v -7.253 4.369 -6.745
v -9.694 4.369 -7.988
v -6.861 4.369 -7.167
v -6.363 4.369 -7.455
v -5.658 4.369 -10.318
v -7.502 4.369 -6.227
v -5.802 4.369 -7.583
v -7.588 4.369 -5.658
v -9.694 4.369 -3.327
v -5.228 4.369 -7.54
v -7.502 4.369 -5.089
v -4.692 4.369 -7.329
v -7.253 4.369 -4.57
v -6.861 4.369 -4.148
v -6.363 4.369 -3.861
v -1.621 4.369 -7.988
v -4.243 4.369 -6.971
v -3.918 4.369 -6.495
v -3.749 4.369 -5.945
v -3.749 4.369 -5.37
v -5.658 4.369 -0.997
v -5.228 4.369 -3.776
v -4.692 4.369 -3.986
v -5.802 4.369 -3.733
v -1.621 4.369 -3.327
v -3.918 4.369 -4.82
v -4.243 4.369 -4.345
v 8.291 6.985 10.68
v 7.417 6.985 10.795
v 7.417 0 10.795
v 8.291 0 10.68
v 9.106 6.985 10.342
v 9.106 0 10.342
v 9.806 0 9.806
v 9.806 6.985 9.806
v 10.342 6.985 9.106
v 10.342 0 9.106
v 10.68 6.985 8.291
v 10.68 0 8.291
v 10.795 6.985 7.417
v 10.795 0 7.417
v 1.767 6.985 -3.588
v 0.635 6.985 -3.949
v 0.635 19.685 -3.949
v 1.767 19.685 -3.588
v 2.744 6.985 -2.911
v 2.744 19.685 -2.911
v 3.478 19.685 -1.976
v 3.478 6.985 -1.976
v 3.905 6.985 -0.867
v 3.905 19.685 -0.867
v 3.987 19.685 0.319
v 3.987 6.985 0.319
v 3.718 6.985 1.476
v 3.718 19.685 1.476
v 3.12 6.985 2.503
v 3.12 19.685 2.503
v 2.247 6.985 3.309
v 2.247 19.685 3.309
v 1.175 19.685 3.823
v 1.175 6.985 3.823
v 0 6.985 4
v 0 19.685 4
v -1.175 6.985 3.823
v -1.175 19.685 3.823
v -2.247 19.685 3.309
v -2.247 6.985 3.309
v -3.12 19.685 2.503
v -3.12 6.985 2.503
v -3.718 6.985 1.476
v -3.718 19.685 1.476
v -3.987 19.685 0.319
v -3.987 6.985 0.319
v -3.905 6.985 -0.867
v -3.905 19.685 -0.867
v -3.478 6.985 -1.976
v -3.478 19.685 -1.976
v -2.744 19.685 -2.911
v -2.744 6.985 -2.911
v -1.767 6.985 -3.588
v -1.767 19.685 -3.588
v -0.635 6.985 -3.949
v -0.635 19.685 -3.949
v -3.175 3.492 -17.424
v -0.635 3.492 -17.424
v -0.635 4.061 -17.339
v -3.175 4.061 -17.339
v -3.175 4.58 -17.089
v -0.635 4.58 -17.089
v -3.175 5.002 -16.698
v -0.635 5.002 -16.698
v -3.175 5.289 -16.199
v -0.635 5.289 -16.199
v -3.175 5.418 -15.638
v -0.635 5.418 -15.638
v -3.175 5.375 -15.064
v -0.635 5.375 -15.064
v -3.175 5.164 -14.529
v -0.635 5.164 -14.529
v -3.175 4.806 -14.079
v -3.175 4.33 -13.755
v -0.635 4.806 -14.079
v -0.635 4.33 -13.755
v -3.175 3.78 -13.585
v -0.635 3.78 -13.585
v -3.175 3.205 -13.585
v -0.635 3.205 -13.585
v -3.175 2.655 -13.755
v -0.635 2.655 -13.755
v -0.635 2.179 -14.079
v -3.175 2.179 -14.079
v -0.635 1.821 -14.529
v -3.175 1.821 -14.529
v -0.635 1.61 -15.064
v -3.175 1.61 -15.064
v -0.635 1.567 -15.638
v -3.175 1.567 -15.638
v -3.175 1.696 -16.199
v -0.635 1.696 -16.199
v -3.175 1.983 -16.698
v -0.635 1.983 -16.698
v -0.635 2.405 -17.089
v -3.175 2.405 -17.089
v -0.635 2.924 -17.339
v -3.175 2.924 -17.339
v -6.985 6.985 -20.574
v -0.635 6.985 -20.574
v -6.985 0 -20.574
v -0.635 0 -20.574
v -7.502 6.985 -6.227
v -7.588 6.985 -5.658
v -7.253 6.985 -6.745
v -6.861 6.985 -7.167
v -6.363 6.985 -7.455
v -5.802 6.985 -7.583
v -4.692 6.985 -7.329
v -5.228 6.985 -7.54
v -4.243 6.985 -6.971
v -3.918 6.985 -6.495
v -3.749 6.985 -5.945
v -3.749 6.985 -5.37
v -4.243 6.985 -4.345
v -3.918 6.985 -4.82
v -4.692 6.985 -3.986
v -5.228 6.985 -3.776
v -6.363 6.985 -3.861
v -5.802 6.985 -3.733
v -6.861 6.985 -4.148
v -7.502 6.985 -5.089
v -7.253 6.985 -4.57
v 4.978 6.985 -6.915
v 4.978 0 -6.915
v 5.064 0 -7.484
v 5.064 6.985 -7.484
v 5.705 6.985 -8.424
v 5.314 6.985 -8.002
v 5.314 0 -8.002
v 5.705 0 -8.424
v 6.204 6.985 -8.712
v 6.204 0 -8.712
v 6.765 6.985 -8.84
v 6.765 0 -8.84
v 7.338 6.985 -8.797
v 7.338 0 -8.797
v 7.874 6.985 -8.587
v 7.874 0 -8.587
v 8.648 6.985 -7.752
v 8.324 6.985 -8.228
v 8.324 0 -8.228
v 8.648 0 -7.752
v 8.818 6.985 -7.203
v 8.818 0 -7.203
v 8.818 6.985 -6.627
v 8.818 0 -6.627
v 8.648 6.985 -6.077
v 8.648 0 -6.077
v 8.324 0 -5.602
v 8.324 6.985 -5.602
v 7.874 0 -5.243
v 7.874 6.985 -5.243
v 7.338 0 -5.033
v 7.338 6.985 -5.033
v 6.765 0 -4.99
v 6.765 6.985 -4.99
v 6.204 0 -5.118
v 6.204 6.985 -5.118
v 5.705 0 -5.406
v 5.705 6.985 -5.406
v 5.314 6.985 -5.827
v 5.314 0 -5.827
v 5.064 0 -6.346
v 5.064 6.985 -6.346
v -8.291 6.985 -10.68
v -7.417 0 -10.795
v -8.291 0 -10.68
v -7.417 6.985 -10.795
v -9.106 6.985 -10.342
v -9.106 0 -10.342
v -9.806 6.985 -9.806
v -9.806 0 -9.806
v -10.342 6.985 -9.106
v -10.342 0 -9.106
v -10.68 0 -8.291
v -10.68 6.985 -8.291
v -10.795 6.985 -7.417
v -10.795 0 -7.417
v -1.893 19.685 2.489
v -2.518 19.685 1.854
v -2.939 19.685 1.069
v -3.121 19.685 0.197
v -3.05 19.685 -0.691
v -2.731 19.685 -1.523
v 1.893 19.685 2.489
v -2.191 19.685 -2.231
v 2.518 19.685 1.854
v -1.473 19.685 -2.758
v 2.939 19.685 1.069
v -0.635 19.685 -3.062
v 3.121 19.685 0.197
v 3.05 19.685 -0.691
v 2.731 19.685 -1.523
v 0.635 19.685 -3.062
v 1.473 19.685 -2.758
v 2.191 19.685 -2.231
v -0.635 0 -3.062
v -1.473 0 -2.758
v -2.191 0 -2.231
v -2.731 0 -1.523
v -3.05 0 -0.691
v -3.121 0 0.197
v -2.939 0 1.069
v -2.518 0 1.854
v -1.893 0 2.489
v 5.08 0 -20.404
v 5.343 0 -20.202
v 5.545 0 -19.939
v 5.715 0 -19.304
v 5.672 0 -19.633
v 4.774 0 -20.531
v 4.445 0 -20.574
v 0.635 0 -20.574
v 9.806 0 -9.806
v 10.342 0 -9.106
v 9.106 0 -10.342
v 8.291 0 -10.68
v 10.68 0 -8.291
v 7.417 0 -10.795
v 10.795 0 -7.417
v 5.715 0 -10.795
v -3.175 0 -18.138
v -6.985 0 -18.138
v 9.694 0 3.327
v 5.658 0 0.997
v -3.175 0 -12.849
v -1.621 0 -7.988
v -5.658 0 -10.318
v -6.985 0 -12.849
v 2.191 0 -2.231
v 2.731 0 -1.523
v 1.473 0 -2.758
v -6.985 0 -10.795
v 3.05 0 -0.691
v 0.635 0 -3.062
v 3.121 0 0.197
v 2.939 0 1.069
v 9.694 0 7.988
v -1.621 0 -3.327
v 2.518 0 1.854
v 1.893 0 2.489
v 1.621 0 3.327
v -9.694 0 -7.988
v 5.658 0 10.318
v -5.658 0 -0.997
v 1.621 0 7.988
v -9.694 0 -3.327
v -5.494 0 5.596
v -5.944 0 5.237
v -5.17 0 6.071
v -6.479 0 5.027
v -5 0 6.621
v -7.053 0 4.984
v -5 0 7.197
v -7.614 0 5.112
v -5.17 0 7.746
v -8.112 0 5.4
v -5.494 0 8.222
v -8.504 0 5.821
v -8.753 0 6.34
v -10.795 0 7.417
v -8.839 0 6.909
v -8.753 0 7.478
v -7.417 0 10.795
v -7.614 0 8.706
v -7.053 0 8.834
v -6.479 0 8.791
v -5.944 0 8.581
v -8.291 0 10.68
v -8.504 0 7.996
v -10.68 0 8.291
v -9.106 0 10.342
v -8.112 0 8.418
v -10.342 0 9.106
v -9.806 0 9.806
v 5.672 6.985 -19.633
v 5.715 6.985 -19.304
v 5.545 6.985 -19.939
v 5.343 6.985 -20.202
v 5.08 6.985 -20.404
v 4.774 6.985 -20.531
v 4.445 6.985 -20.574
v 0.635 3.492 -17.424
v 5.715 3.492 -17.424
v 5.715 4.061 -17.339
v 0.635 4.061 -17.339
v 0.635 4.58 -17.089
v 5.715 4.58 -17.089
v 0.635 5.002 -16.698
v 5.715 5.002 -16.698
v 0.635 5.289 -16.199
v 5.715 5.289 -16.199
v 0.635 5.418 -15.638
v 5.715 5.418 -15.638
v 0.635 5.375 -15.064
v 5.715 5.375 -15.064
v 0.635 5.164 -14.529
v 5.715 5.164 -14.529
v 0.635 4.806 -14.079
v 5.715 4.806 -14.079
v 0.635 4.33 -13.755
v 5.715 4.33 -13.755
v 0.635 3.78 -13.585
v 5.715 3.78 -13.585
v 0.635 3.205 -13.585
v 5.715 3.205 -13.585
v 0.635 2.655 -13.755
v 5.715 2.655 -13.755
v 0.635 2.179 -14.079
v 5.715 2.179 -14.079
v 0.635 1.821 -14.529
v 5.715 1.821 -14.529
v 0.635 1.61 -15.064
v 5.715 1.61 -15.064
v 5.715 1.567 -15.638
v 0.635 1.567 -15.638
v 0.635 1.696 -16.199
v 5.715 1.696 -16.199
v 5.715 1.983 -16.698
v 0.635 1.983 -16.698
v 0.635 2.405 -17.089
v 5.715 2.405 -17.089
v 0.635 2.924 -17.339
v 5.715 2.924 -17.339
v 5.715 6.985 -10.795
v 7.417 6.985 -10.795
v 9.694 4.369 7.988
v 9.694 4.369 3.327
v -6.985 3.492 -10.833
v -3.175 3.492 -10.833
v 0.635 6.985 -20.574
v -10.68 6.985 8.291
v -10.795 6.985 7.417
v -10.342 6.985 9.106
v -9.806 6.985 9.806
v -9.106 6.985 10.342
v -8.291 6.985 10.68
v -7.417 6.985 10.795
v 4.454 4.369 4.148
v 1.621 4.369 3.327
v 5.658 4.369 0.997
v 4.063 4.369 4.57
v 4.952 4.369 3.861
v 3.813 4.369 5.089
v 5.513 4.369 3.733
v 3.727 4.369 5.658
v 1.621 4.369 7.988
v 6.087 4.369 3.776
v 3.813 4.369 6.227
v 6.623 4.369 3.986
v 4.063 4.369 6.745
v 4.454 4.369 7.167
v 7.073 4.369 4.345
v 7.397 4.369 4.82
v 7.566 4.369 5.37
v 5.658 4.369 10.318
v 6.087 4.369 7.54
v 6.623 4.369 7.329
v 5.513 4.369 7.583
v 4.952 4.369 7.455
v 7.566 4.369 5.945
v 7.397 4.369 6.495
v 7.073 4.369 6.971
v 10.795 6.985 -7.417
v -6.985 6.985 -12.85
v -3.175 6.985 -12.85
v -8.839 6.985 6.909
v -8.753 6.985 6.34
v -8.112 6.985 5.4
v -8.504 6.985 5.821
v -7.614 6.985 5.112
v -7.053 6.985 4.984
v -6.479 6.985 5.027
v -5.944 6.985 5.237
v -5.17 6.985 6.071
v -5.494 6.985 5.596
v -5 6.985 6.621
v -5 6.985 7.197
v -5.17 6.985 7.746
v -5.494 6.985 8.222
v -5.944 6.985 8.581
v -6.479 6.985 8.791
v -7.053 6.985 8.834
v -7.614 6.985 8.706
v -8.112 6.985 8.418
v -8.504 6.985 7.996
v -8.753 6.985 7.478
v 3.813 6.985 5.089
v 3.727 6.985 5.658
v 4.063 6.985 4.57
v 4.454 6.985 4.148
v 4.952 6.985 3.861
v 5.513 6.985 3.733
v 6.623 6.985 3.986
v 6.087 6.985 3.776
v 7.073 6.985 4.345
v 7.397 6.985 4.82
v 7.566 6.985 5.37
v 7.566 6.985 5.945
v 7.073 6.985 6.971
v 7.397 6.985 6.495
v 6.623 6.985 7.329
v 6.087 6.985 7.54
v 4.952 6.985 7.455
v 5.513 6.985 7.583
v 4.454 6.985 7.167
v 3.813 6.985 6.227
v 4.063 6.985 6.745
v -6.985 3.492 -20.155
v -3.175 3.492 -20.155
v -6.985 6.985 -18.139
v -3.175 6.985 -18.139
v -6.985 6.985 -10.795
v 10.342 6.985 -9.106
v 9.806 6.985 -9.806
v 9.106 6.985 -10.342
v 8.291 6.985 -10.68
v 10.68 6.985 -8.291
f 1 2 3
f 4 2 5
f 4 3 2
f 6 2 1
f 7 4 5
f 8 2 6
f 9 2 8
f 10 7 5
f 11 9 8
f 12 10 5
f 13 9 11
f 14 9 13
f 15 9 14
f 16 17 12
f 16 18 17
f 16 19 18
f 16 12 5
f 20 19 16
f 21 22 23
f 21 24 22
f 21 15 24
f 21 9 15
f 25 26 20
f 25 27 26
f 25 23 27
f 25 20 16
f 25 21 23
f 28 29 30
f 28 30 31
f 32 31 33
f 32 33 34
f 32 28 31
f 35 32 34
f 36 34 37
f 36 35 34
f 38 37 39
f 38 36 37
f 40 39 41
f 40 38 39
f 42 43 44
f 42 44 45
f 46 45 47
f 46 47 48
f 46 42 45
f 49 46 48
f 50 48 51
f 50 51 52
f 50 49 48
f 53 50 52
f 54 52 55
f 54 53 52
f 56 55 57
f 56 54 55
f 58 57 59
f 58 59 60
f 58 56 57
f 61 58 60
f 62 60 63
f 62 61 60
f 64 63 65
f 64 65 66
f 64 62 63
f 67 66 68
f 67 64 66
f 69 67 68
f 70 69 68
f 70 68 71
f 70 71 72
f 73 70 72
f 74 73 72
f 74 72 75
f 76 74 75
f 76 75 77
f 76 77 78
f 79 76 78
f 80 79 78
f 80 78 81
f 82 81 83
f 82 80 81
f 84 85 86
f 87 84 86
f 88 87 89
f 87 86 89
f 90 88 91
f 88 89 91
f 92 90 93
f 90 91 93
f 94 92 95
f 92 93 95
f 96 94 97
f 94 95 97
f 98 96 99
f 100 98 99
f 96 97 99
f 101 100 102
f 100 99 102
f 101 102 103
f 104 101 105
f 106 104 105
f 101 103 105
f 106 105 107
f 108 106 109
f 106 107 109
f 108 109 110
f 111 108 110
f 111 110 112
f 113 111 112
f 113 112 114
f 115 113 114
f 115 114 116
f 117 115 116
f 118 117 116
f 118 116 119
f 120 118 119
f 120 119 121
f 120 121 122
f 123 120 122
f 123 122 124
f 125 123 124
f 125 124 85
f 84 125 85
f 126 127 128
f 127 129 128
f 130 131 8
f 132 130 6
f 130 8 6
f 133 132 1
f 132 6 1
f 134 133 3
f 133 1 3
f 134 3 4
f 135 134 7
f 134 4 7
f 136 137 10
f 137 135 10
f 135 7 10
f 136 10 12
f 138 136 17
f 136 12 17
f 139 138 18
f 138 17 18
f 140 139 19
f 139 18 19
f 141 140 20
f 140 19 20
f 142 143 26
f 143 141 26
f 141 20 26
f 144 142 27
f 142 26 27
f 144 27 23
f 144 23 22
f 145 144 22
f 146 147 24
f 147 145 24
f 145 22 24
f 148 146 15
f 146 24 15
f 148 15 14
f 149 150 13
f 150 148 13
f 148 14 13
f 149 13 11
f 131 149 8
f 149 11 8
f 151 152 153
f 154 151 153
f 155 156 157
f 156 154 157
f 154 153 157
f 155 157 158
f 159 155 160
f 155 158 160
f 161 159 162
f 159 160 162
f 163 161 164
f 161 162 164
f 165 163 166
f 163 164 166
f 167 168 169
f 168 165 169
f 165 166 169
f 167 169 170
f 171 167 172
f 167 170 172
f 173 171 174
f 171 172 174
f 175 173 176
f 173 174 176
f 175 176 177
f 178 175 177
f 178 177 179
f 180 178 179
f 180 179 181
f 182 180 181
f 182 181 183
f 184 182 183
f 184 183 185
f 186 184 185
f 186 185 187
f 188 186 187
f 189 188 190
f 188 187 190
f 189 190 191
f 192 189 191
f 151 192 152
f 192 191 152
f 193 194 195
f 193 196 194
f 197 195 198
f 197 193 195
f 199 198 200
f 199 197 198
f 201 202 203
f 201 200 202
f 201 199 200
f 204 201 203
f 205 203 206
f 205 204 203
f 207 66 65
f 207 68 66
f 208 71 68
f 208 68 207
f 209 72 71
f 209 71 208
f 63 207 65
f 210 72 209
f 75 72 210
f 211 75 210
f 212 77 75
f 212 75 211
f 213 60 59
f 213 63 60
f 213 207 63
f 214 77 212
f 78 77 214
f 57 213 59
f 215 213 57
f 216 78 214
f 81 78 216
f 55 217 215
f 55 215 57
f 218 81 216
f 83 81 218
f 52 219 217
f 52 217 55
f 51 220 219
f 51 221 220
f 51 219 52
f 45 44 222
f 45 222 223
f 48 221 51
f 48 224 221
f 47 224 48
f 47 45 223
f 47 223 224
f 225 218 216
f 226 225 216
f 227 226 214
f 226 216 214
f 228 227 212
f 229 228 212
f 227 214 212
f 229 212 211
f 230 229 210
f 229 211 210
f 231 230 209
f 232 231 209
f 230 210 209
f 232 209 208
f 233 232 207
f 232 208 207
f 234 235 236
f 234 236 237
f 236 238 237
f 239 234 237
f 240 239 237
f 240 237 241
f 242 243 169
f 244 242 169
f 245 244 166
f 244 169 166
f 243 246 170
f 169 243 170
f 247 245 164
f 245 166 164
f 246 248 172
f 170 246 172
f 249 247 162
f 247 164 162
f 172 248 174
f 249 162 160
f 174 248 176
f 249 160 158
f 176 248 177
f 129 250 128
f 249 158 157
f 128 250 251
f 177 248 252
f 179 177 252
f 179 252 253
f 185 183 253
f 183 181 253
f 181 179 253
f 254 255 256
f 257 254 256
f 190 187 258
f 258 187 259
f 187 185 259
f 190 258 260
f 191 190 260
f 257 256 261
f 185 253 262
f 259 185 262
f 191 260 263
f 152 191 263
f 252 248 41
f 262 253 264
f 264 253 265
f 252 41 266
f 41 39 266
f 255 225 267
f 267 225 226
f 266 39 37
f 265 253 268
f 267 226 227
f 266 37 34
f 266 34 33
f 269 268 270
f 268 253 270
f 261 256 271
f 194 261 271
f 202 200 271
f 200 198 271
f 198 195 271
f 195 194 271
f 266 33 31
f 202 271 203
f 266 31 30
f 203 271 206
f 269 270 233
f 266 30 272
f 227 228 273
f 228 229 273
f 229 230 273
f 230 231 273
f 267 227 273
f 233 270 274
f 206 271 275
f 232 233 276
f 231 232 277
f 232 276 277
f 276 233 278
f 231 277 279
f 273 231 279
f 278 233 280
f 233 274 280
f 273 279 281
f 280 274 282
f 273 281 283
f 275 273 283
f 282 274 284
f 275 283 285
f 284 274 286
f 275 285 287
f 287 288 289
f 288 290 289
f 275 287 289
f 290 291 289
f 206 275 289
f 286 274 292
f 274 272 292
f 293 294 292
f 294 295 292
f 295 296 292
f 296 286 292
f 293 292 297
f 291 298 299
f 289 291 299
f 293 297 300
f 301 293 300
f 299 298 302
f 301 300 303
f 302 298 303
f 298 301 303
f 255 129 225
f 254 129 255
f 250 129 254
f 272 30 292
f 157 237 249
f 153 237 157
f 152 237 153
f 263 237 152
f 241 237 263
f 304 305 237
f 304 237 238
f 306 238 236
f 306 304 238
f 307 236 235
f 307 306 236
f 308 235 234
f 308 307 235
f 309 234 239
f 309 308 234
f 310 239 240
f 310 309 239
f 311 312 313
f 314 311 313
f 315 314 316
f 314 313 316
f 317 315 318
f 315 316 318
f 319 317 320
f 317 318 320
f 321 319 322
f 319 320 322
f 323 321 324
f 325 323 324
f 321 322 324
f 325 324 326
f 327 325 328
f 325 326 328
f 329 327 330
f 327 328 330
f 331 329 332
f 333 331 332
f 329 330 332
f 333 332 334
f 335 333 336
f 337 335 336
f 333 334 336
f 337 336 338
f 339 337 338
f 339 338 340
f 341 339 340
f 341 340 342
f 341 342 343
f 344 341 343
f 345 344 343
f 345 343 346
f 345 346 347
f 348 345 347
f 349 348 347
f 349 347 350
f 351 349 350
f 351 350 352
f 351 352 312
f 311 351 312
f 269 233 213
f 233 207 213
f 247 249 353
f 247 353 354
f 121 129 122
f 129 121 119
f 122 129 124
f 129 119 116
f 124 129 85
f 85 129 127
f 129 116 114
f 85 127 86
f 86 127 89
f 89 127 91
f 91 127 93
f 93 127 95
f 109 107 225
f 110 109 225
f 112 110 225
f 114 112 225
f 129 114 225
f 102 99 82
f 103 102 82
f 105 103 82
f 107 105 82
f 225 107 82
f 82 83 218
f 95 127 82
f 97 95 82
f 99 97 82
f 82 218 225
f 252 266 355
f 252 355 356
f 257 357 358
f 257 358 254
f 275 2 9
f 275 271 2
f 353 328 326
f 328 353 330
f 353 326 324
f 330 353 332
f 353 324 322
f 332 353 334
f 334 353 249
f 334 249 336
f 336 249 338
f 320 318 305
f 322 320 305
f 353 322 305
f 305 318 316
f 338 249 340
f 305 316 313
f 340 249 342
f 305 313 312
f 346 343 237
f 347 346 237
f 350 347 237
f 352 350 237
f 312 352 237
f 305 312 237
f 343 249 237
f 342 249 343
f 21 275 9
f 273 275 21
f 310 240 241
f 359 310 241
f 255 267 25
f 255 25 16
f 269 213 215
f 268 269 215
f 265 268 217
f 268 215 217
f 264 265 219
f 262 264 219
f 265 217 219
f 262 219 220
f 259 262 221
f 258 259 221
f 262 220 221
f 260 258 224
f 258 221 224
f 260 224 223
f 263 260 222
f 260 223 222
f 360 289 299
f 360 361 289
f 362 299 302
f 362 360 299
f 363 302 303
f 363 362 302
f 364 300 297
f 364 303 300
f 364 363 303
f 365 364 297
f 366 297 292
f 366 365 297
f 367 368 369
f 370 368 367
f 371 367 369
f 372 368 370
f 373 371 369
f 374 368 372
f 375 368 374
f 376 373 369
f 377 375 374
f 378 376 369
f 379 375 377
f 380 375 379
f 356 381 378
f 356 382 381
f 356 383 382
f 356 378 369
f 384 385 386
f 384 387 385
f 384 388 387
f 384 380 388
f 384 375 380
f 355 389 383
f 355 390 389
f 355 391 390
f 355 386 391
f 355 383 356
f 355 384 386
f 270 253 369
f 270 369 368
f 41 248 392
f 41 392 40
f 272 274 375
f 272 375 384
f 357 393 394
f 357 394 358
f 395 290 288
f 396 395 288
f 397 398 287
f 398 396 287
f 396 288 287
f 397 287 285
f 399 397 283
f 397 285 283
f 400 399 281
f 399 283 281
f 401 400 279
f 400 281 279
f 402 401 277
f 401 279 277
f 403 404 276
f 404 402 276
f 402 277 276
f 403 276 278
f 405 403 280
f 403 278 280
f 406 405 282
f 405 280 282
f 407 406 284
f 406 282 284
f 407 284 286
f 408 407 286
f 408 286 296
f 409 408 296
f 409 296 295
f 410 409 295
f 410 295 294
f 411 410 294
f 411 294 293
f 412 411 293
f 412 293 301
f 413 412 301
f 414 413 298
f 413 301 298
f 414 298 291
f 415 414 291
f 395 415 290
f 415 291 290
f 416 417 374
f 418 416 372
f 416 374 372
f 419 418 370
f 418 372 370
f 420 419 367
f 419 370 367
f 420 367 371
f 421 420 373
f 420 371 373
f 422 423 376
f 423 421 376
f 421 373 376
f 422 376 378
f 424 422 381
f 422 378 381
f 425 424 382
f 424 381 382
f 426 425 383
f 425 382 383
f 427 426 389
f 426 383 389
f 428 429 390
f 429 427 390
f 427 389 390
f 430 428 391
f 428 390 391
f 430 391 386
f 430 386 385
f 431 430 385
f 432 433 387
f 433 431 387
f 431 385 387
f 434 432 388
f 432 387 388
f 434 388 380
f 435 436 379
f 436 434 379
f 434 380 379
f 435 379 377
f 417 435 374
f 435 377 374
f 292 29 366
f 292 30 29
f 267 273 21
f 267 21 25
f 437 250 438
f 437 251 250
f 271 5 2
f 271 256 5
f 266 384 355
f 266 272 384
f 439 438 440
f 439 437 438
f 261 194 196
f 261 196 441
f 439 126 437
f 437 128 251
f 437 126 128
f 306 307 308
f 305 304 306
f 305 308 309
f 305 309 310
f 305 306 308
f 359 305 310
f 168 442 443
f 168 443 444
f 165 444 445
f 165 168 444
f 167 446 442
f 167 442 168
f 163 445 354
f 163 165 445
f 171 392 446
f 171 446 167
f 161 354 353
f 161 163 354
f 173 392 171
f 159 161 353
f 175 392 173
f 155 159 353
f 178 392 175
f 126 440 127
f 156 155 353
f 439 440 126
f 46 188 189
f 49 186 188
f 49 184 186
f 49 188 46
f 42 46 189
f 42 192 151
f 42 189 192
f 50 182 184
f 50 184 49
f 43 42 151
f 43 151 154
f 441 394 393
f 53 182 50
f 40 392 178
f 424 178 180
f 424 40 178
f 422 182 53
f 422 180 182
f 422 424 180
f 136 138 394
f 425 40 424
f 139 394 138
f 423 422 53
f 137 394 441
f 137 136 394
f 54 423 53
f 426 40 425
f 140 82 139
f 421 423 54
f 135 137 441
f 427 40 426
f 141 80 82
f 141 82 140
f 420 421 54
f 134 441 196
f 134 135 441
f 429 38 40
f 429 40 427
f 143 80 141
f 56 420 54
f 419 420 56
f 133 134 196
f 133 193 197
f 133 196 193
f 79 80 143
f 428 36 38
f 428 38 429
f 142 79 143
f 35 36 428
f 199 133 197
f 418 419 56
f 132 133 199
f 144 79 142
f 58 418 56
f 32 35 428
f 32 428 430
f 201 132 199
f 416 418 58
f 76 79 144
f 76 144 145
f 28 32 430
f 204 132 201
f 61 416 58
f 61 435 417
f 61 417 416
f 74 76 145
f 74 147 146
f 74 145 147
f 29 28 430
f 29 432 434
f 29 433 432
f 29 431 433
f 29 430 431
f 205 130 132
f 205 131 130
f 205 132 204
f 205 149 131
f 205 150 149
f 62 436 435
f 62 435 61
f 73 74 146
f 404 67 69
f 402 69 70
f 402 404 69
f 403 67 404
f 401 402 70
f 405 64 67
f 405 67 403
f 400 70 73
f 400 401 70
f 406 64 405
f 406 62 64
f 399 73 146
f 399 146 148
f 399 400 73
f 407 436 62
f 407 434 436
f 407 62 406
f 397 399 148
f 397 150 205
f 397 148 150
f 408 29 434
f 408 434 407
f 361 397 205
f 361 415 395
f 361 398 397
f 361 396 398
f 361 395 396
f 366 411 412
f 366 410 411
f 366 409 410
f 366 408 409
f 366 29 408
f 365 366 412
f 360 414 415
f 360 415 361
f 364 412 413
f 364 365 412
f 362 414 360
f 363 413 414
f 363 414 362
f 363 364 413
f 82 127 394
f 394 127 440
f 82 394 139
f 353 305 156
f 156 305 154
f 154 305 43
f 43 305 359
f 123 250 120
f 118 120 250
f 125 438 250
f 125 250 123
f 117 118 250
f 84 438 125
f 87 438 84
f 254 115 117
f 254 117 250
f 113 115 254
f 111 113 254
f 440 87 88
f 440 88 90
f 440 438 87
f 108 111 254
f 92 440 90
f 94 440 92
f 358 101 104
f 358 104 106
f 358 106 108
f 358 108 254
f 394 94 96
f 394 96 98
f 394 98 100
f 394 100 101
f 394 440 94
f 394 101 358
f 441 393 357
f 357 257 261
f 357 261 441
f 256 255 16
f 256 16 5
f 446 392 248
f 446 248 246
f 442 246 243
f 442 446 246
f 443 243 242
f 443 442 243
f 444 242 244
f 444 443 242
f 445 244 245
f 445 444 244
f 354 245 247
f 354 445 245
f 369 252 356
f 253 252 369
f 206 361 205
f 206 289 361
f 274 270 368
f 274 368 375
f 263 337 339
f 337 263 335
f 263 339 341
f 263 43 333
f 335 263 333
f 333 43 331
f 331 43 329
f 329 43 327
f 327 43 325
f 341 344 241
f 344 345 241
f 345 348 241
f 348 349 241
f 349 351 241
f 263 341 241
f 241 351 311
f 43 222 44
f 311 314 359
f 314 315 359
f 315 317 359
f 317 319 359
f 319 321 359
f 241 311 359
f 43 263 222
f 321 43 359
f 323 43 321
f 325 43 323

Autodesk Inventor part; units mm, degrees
ref_plane "YZ Plane" through (0, 0, 0) normal (1, 0, 0) x (0, 1, 0)
ref_plane "XZ Plane" through (0, 0, 0) normal (0, 1, 0) x (-1, 0, 0)
ref_plane "XY Plane" through (0, 0, 0) normal (0, 0, 1) x (1, 0, 0)
sketch "Sketch1" plane through (0, 0, 0) normal (0, 1, 0) x (-1, 0, 0)
  line L0 (-10.795, 10.795) -> (10.795, 10.795)
  line L1 (10.795, 10.795) -> (10.795, -10.795)
  line L2 (-10.795, -10.795) -> (-10.795, 10.795)
  circle A0 centre (5.6576, -5.6576) radius 1.9304
  circle A1 centre (6.9088, 6.9088) radius 1.9304
  circle A2 centre (-5.6576, 5.6576) radius 1.9304
  circle A3 centre (-6.9088, -6.9148) radius 1.9304
  line L3 (-5.715, -10.795) -> (-5.715, -20.574)
  line L4 (-5.715, -20.574) -> (6.985, -20.574)
  line L5 (6.985, -20.574) -> (6.985, -10.795)
  line L6 (10.795, -10.795) -> (6.985, -10.795)
  line L7 (-5.715, -10.795) -> (-10.795, -10.795)
  point P0 (0, 0)
  dimension "d2" = 10.795
  dimension "d3" = 10.795
  dimension "d4" = 3.8608
  dimension "d5" = 5.6576
  dimension "d6" = 5.6576
  dimension "d7" = 3.8608
  dimension "d8" = 6.9088
  dimension "d9" = 6.9088
  dimension "d10" = 3.8608
  dimension "d11" = 5.6576
  dimension "d12" = 5.6576
  dimension "d13" = 3.8608
  dimension "d14" = 12.7
  dimension "d16" = 6.985
  dimension "d45" = 10.795
  dimension "d46" = 10.795
  dimension "d47" = 10.795
extrude "Extrusion1" add sketch "Sketch1" along normal blind 6.985
sketch "Sketch2" plane through (-6.985, 0, -20.574) normal (-1, 0, 0) x (0, 0, 1)
  circle A0 centre (5.08, 3.4925) radius 4.6609 construction
  line L0 (9.779, 0) -> (0, 0) projected
  line L1 (0, 0) -> (0, 6.985) projected
  line L2 (9.7409, 3.4925) -> (7.4105, -0.544)
  line L3 (7.4105, -0.544) -> (2.7496, -0.544)
  line L4 (2.7496, -0.544) -> (0.4191, 3.4925)
  line L5 (0.4191, 3.4925) -> (2.7495, 7.529)
  line L6 (2.7495, 7.529) -> (7.4104, 7.529)
  line L7 (7.4104, 7.529) -> (9.7409, 3.4925)
  point P0 (20.574, 0)
  dimension "d19" = 9.3218
  dimension "d20" = 3.4925
  dimension "d21" = 5.08
extrude "Extrusion2" cut sketch "Sketch2" against normal blind 3.81
sketch "Sketch3" plane through (5.715, 0, -10.795) normal (1, 0, 0) x (0, 0, -1)
  circle A0 centre (4.699, 3.4925) radius 1.9304
  line L0 (9.779, 0) -> (9.779, 6.985) projected
  line L1 (0, 6.985) -> (9.779, 6.985) projected
  point P0 (-10.795, 0)
  dimension "d24" = 3.8608
  dimension "d25" = 5.08
  dimension "d26" = 3.4925
extrude "Extrusion3" cut sketch "Sketch3" against normal through all
sketch "Sketch4" plane through (0, 6.985, 0) normal (0, 1, 0) x (1, 0, 0)
  circle A0 centre (0, 0) radius 4
  dimension "d29" = 8
extrude "Extrusion4" add sketch "Sketch4" along normal blind 12.7
sketch "Sketch5" plane through (0, 19.685, 0) normal (0, 1, 0) x (1, 0, 0)
  arc A0 (1.8926, -2.4892) -> (-1.8926, -2.4892) centre (0, 0) ccw
  line L0 (-1.8926, -2.4892) -> (1.8926, -2.4892)
  dimension "d32" = 6.254
  dimension "d33" = 2.4892
fillet "Fillet1" radius 3.3782 4 edges at (10.795, 3.4925, 10.795) (10.795, 3.4925, -10.795) (-10.795, 3.4925, 10.795) (-10.795, 3.4925, -10.795)
extrude "Extrusion5" cut sketch "Sketch5" against normal through all
sketch "Sketch6" plane through (0, 19.685, 0) normal (0, 1, 0) x (1, 0, 0)
  line L0 (-6.985, 20.574) -> (5.715, 20.574) projected
  line L1 (0.635, 0) -> (0.635, 20.574)
  line L2 (0.635, 20.574) -> (-0.635, 20.574)
  line L3 (-0.635, 20.574) -> (-0.635, 0)
  line L4 (-0.635, -20.574) -> (0.635, 20.574) construction
  line L5 (0.635, -20.574) -> (-0.635, 20.574) construction
  line L6 (-0.635, 0) -> (0.635, 0)
  point P0 (0, 0)
  dimension "d37" = 1.27
extrude "Extrusion6" cut sketch "Sketch6" against normal through all
sketch "Sketch7" plane through (0, 0, 0) normal (0, -1, 0) x (1, 0, 0)
  circle A0 centre (-5.6576, -5.6576) radius 1.9304 projected
  circle A1 centre (-5.6576, -5.6576) radius 4.6609 construction
  circle A2 centre (5.6576, 5.6576) radius 1.9304 projected
  circle A3 centre (5.6576, 5.6576) radius 4.6609 construction
  line L0 (-5.6576, -0.9967) -> (-1.6211, -3.3271)
  line L1 (-1.6211, -3.3271) -> (-1.6211, -7.988)
  line L2 (-1.6211, -7.988) -> (-5.6576, -10.3185)
  line L3 (-5.6576, -10.3185) -> (-9.694, -7.988)
  line L4 (-9.694, -7.988) -> (-9.694, -3.3271)
  line L5 (-9.694, -3.3271) -> (-5.6576, -0.9967)
  line L6 (5.6576, 0.9967) -> (1.6211, 3.3271)
  line L7 (1.6211, 3.3271) -> (1.6211, 7.988)
  line L8 (1.6211, 7.988) -> (5.6576, 10.3185)
  line L9 (5.6576, 10.3185) -> (9.694, 7.988)
  line L10 (9.694, 7.988) -> (9.694, 3.3271)
  line L11 (9.694, 3.3271) -> (5.6576, 0.9967)
  point P0 (0, 0)
  dimension "d40" = 9.3218
  dimension "d41" = 9.3218
extrude "Extrusion7" cut sketch "Sketch7" against normal blind 4.3688
fillet "Fillet2" radius 1.27 1 edges at (5.715, 3.4925, -20.574)
properties part number "clamping hub 6mm D"
